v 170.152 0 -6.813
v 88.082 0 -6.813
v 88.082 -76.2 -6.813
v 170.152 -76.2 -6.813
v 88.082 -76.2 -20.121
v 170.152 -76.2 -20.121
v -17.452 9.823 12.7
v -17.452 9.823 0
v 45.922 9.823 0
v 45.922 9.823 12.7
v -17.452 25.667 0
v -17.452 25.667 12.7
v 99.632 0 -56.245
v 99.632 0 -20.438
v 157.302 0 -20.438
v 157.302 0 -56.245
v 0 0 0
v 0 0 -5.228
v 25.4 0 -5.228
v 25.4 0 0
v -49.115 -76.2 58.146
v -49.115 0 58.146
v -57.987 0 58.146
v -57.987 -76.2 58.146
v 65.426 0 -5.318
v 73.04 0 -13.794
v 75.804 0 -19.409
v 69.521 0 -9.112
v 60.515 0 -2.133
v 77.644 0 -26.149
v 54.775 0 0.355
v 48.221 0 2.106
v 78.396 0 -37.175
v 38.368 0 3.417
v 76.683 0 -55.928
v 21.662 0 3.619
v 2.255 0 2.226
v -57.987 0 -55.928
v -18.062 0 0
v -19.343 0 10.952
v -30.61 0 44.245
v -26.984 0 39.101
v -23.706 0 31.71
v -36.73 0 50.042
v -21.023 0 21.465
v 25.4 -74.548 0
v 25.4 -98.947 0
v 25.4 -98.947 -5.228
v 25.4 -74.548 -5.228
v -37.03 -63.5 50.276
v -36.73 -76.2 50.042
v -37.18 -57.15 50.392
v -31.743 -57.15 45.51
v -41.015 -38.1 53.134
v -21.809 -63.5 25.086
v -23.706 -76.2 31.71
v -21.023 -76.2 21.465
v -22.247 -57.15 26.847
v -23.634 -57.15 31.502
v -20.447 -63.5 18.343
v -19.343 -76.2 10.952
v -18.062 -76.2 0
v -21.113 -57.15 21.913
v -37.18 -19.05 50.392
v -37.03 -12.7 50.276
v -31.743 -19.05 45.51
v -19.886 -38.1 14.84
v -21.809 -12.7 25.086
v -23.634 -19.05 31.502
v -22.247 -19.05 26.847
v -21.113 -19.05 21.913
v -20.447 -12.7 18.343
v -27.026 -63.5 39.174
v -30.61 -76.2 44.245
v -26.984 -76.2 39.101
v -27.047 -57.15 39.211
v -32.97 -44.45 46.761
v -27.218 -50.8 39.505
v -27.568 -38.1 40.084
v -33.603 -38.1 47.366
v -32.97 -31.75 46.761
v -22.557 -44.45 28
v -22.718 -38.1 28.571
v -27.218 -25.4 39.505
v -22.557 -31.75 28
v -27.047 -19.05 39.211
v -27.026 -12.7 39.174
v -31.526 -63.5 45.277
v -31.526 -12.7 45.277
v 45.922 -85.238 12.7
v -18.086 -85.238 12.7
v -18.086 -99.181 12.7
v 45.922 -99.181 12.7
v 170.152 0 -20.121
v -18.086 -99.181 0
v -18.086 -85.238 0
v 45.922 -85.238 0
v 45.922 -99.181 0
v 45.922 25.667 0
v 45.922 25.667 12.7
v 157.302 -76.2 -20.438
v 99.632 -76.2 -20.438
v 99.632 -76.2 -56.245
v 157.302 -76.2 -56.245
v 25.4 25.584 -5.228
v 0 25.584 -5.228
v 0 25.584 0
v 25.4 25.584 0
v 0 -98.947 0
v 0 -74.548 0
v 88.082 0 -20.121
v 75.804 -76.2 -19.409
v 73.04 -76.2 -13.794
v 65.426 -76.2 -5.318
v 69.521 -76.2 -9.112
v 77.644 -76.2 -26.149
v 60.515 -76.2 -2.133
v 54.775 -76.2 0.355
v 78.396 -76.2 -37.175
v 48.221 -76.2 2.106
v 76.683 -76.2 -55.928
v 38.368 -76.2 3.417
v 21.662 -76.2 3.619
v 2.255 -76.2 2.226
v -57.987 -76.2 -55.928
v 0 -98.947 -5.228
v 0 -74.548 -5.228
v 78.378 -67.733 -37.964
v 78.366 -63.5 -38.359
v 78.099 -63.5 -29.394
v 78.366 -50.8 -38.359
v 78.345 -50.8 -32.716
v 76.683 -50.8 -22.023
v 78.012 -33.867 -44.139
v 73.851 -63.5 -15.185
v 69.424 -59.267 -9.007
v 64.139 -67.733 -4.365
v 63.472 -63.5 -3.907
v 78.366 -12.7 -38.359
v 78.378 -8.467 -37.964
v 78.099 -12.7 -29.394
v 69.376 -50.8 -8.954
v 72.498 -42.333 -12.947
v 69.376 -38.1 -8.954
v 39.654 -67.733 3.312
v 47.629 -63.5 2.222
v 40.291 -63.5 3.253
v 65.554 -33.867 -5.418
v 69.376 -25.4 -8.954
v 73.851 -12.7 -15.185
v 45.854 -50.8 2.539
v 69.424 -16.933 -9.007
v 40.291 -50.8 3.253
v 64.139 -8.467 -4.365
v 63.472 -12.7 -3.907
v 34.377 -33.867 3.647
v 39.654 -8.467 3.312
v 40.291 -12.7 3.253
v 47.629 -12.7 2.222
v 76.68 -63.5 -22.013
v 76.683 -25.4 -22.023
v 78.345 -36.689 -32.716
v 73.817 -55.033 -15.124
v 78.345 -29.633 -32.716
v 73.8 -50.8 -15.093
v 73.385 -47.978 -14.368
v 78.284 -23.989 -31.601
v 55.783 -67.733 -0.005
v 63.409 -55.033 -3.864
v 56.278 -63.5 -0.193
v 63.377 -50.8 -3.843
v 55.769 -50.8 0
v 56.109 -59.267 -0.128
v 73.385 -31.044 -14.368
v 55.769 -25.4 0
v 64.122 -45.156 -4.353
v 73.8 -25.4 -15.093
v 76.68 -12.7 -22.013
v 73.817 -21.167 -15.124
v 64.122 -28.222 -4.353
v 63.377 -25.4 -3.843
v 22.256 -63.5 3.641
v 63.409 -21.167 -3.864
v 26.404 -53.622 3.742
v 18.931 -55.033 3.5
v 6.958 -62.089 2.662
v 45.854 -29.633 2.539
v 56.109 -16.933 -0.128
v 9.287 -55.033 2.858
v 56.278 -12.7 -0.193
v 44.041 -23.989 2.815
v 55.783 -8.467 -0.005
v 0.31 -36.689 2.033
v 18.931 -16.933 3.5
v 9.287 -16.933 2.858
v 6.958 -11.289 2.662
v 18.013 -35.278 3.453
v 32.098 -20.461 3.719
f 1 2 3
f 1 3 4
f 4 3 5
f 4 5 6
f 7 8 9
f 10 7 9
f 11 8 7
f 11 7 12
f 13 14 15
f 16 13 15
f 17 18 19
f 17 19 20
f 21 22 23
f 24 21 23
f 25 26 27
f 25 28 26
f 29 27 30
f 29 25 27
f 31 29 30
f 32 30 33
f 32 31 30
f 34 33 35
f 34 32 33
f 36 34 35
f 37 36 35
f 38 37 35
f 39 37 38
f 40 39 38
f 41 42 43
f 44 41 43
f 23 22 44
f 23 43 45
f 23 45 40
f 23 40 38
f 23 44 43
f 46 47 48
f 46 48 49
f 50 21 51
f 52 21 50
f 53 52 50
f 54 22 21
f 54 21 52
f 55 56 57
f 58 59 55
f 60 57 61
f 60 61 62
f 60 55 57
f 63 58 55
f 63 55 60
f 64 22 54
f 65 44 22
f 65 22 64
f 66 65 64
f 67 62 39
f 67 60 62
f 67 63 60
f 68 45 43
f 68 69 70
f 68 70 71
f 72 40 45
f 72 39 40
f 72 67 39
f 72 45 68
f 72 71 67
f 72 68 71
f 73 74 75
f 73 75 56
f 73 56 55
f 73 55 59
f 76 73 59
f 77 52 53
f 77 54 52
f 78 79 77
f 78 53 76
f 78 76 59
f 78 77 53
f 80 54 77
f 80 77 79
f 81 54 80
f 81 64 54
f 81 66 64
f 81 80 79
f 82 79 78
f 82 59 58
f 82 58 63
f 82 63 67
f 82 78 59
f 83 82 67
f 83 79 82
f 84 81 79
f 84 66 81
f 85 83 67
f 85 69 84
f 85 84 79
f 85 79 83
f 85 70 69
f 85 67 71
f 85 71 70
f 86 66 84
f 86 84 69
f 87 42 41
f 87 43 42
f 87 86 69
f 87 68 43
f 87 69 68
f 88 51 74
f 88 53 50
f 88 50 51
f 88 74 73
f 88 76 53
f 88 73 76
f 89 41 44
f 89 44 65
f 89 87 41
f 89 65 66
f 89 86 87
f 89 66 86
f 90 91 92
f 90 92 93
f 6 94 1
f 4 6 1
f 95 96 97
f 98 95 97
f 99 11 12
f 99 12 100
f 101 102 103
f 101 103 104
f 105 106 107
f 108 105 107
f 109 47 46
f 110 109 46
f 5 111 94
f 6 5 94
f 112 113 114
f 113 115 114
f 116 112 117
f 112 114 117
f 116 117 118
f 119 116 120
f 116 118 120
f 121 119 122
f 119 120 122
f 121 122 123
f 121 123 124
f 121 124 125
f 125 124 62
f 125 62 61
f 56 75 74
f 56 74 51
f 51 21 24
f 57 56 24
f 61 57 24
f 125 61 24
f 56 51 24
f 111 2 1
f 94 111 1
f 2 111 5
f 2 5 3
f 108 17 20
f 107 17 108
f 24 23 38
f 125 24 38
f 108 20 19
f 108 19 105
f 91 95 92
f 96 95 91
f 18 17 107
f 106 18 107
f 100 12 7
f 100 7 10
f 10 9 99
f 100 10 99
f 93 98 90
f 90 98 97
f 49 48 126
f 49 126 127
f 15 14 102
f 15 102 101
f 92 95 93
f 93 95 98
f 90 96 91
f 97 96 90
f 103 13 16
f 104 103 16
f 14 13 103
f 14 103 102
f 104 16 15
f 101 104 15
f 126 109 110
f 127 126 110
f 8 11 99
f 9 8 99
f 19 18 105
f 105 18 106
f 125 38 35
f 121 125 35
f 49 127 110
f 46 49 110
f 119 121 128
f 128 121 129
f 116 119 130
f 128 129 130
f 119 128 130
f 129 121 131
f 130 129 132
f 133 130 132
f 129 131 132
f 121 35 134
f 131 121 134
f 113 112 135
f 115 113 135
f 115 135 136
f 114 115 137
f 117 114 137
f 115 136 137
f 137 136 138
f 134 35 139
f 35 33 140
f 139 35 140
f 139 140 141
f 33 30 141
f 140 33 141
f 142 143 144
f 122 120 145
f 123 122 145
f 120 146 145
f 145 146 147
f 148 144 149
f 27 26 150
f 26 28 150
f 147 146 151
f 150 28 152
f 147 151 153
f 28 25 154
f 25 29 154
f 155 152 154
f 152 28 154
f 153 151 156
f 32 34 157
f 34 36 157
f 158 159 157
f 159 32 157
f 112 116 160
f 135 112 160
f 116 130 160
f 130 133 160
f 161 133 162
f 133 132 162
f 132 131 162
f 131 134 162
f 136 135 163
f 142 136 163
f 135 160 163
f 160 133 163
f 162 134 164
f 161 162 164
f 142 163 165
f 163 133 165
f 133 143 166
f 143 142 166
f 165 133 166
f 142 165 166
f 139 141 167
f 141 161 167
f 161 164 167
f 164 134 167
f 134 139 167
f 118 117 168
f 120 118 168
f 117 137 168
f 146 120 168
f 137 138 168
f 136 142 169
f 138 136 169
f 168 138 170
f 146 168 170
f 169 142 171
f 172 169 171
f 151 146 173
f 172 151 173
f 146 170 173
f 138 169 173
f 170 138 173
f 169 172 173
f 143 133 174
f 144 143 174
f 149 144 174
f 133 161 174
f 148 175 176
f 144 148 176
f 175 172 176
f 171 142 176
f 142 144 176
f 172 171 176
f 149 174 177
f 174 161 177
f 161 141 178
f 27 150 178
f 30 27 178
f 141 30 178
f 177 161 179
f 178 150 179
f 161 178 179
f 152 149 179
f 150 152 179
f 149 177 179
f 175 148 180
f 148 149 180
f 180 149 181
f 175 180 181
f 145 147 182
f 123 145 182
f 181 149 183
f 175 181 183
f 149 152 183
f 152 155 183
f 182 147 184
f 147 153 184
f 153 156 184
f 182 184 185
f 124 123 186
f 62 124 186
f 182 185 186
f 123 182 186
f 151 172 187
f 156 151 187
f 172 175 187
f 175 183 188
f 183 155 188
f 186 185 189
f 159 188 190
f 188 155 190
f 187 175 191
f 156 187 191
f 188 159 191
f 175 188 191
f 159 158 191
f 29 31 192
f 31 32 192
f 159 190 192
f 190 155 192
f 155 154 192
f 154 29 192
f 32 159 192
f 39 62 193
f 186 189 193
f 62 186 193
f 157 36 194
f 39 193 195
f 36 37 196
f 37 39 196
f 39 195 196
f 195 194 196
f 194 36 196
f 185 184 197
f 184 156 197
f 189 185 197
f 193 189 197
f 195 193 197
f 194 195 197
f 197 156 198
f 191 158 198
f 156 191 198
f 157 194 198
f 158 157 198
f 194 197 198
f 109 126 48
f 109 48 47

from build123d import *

# Parameters (mm, degrees)
F1_DEPTH = 76.2
F2_W     = 64.0079975128
F2_H     = 13.9423385262
F3_DEPTH = 12.7
F2_W_2   = 63.3742548525
F2_H_2   = 15.8435637131
F4_W     = 25.5835857242
F4_H     = 5.228376016
F5_DEPTH = 25.4
F4_W_2   = 24.3990942836
F6_W     = 57.6705858111
F6_H     = 35.8064584434
F7_DEPTH = 76.2
F8_W     = 82.0696726441
F8_H     = 13.3085940033
F9_DEPTH = 76.2


with BuildPart() as f1:
    # F0 (on Front) → F1 (new body)
    with BuildSketch(Plane.XZ):
        with BuildLine():
            add(Edge.make_bspline(
                [(-49.1150505841, 58.1458806992), (-40.9001251508, 53.260319122), (-22.7413471261, 42.4609723807), (-19.7175260083, 15.0244173228), (-18.0616639555, 0)],
                knots=[0, 0, 0, 0, 0.4523941766, 1, 1, 1, 1], degree=3))
            Line((-49.1150505841, 58.1458806992), (-57.9874478281, 58.1458806992))
            Line((-57.9874478281, 58.1458806992), (-57.9874478281, 0))
            Line((-57.9874478281, 0), (-57.9874478281, -55.9277832508))
            Line((-57.9874478281, -55.9277832508), (76.6828507185, -55.9277832508))
            add(Edge.make_bspline(
                [(76.6828507185, -55.9277832508), (78.17864908, -44.0785526487), (81.0901294151, -21.014747544), (56.3187828934, 8.5941915447), (10.0981671256, 3.2536908883), (-18.0616639555, 0)],
                knots=[0, 0, 0, 0, 0.2922183757, 0.5687852563, 1, 1, 1, 1], degree=3))
        make_face()
    extrude(amount=F1_DEPTH)


with BuildPart() as f3:
    # F2 (on Top) → F3 (new body)
    with BuildSketch(Plane.XY):
        with Locations((13.9181278646, -92.2095440328)):
            Rectangle(F2_W, F2_H)
    extrude(amount=F3_DEPTH)


with BuildPart() as f3b:
    # F2 (on Top) → F3, piece 2 (new body)
    with BuildSketch(Plane.XY):
        with Locations((14.2349991947, 17.744790297)):
            Rectangle(F2_W_2, F2_H_2)
    extrude(amount=F3_DEPTH)


with BuildPart() as f5:
    # F4 (on Right) → F5 (new body)
    with BuildSketch(Plane.YZ):
        with Locations((12.7917928621, -2.614188008)):
            Rectangle(F4_W, F4_H)
    extrude(amount=F5_DEPTH)


with BuildPart() as f5b:
    # F4 (on Right) → F5, piece 2 (new body)
    with BuildSketch(Plane.YZ):
        with Locations((-86.7472924292, -2.614188008)):
            Rectangle(F4_W_2, F4_H)
    extrude(amount=F5_DEPTH)


with BuildPart() as f7:
    # F6 (on Front) → F7 (new body)
    with BuildSketch(Plane.XZ):
        with Locations((128.4671016037, -38.3414272219)):
            Rectangle(F6_W, F6_H)
    extrude(amount=F7_DEPTH)


with BuildPart() as f9:
    # F8 (on Front) → F9 (new body)
    with BuildSketch(Plane.XZ):
        with Locations((129.1167251766, -13.4670296684)):
            Rectangle(F8_W, F8_H)
    extrude(amount=F9_DEPTH)


solid = Compound([f1.part, f3.part, f3b.part, f5.part, f5b.part, f7.part, f9.part])
